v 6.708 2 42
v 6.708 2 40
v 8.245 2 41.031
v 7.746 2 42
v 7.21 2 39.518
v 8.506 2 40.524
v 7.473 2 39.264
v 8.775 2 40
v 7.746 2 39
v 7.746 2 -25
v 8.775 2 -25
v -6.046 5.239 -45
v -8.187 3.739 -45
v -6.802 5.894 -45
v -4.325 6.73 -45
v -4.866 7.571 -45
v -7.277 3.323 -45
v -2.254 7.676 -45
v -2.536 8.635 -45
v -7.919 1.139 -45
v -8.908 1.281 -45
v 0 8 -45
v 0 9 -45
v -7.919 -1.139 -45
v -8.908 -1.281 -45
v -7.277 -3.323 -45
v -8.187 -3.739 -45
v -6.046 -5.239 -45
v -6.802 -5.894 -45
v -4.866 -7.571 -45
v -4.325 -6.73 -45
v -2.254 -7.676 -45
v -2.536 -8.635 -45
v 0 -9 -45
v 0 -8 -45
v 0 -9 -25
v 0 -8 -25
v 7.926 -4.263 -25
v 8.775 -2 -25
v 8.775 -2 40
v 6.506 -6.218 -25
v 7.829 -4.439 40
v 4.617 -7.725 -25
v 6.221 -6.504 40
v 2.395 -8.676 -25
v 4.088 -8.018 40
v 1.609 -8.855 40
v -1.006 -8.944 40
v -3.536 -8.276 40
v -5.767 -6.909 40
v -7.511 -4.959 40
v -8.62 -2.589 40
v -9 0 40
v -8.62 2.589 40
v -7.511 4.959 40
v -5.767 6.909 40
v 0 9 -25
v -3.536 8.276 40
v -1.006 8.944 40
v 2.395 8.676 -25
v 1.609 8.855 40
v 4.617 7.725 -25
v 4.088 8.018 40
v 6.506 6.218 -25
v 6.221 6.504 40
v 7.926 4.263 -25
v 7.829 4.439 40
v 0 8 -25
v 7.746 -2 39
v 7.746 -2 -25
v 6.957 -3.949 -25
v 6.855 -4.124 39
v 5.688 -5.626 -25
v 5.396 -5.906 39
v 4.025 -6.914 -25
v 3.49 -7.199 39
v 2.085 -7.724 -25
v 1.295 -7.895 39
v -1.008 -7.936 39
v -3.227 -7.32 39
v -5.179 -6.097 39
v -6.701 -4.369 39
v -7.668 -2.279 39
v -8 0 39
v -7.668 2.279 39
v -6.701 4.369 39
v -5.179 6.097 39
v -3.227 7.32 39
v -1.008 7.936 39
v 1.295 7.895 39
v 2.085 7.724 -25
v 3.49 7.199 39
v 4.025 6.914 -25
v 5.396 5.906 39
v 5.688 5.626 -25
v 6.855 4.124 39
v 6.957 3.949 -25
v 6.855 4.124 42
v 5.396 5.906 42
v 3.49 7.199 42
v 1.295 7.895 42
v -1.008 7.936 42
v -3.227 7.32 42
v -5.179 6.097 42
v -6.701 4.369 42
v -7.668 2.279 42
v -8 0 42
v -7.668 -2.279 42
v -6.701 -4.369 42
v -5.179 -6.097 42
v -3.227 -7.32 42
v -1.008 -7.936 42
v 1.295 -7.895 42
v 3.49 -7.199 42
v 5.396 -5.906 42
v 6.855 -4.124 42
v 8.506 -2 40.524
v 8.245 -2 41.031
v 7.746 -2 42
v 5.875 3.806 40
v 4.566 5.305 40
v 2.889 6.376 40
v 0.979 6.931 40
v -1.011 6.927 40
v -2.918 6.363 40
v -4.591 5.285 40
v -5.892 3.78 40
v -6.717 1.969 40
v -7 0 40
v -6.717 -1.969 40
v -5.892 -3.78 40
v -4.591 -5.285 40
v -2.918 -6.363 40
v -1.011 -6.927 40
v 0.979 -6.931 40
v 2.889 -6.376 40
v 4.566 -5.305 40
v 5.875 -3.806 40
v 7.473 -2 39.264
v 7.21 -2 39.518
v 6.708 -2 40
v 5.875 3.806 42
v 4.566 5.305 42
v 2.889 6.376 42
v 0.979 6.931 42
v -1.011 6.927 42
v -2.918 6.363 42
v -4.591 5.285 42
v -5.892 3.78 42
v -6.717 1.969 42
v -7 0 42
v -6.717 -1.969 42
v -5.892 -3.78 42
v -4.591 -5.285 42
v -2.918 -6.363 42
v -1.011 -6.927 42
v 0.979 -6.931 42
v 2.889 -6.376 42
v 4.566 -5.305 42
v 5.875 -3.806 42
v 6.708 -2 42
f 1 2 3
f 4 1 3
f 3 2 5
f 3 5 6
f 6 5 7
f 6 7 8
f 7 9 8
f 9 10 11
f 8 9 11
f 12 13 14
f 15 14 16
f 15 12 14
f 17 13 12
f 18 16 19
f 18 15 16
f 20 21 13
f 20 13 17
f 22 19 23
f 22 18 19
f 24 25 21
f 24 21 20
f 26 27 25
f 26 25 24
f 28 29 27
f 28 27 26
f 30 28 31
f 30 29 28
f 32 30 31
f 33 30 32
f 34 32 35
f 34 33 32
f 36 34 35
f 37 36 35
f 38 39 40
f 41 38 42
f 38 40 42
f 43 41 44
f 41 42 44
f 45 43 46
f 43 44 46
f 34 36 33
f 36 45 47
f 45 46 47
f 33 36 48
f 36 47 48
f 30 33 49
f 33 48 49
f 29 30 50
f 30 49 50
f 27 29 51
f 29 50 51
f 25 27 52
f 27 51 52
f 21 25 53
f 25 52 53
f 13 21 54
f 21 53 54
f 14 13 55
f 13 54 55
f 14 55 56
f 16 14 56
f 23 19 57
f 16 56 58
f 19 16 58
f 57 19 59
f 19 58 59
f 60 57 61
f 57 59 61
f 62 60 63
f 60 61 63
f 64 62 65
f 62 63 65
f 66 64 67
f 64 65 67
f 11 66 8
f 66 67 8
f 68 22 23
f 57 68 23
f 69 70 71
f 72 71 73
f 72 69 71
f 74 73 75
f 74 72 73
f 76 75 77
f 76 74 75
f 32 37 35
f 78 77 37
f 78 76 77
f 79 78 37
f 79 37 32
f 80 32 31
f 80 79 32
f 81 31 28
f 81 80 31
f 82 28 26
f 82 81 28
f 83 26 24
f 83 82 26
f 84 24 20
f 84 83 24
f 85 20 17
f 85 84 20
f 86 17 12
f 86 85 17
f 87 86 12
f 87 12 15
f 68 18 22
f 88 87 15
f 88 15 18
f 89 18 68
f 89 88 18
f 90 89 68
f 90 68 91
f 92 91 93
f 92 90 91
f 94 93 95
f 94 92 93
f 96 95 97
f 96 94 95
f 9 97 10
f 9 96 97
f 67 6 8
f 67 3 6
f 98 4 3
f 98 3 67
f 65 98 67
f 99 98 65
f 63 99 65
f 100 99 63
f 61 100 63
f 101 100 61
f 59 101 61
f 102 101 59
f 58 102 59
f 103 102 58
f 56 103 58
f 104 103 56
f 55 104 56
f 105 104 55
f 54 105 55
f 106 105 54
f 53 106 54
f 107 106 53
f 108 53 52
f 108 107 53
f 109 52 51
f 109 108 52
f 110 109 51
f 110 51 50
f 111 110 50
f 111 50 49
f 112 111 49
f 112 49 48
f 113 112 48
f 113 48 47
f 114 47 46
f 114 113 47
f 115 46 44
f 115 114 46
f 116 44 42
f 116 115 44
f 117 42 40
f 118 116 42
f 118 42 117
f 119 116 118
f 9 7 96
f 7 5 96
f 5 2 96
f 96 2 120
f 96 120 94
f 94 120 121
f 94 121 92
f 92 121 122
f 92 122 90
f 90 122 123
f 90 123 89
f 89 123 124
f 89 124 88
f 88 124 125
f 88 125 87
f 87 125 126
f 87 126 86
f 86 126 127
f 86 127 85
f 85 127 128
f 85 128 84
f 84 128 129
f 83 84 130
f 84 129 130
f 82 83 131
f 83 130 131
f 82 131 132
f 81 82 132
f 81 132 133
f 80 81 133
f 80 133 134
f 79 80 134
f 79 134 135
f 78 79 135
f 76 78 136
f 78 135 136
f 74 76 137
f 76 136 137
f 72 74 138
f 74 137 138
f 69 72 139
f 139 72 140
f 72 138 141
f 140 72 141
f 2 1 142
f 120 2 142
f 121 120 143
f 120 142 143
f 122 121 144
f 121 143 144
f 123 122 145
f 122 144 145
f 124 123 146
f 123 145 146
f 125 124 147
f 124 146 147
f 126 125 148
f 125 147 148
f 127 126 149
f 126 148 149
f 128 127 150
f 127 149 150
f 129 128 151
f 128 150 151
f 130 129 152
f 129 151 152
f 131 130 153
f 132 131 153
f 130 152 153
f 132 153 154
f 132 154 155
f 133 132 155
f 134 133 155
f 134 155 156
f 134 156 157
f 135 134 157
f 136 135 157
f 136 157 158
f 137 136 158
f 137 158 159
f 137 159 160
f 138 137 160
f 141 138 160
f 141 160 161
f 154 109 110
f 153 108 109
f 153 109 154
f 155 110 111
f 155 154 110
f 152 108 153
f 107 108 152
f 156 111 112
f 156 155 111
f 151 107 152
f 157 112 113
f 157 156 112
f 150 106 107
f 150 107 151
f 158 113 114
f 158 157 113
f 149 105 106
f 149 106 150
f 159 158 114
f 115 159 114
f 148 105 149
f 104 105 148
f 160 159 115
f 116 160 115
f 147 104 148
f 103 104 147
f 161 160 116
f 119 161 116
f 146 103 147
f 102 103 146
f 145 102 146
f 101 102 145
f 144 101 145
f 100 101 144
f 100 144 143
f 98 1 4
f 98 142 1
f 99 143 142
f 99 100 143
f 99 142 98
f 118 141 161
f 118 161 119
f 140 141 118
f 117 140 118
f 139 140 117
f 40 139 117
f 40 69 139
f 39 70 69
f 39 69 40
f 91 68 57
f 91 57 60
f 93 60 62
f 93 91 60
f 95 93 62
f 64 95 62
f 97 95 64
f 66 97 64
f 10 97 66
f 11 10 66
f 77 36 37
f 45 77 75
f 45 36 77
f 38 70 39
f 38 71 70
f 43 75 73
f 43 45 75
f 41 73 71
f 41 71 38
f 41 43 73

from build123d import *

# Parameters (mm, degrees)
F0_R      = 9
F1_DEPTH  = 40
F3_R      = 9
F4_R      = 8
F6_R      = 8
F8_DEPTH  = 39
F9_R      = 9
F9_R_2    = 8
F10_DEPTH = 45
F12_DEPTH = 20
F13_W     = 4
F13_H     = 4
F14_DEPTH = 100
F7_R      = 7
F15_DEPTH = 25
F16_SIZE2 = 0.99999
F16_SIZE  = 0.99999


# Not quite as in the source:
# - a fillet or chamfer is up to 0.001 mm smaller than in the source, because OpenCascade refuses the exact size


with BuildPart() as f1:
    # F0 (on Top) → F1 (new body)
    with BuildSketch(Plane.XY):
        Circle(F0_R)
    extrude(amount=F1_DEPTH)

    # F3 (on face) → F5 section 0
    with BuildSketch(Plane.XY.offset(40)):
        Circle(F3_R)
    # F4 (on offset) → F5 section 1
    with BuildSketch(Plane.XY.offset(42)):
        Circle(F4_R)
    loft()

    # F6 (on face) → F8 (cut)
    with BuildSketch(Plane(origin=(0, 0, 0), x_dir=(1, 0, 0), z_dir=(0, 0, -1))):
        Circle(F6_R)
    extrude(amount=-F8_DEPTH, mode=Mode.SUBTRACT)

    # F9 (on face) → F10 (join)
    with BuildSketch(Plane(origin=(0, 0, 0), x_dir=(1, 0, 0), z_dir=(0, 0, -1))):
        Circle(F9_R)
        Circle(F9_R_2, mode=Mode.SUBTRACT)
    extrude(amount=F10_DEPTH)

    # F11 (on face) → F12 (cut)
    with BuildSketch(Plane(origin=(0, 0, -45), x_dir=(1, 0, 0), z_dir=(0, 0, -1))):
        with BuildLine():
            ThreePointArc((0, -9), (6.3639610307, -6.3639610307), (9, 0))
            ThreePointArc((9, 0), (6.3639610307, 6.3639610307), (0, 9))
            Line((0, 9), (0, 8))
            ThreePointArc((0, 8), (5.6568542495, 5.6568542495), (8, 0))
            ThreePointArc((8, 0), (5.6568542495, -5.6568542495), (0, -8))
            Line((0, -8), (0, -9))
        make_face()
    extrude(amount=-F12_DEPTH, mode=Mode.SUBTRACT)

    # F13 (on face) → F14 (cut)
    with BuildSketch(Plane(origin=(0, 0, -25), x_dir=(1, 0, 0), z_dir=(0, 0, -1))):
        with Locations((8, 0)):
            Rectangle(F13_W, F13_H)
    extrude(amount=-F14_DEPTH, mode=Mode.SUBTRACT)

    # F7 (on face) → F15 (cut)
    with BuildSketch(Plane.XY.offset(42)):
        Circle(F7_R)
    extrude(amount=-F15_DEPTH, mode=Mode.SUBTRACT)

    # F16 (size 1 and 1 in the source; OpenCascade refuses exactly that, so slightly less here)
    f16_edges = [f1.edges().sort_by_distance(p)[0] for p in [
        (-7, 0, 39),
    ]]
    chamfer(f16_edges, length=F16_SIZE, length2=F16_SIZE2)


solid = f1.part
